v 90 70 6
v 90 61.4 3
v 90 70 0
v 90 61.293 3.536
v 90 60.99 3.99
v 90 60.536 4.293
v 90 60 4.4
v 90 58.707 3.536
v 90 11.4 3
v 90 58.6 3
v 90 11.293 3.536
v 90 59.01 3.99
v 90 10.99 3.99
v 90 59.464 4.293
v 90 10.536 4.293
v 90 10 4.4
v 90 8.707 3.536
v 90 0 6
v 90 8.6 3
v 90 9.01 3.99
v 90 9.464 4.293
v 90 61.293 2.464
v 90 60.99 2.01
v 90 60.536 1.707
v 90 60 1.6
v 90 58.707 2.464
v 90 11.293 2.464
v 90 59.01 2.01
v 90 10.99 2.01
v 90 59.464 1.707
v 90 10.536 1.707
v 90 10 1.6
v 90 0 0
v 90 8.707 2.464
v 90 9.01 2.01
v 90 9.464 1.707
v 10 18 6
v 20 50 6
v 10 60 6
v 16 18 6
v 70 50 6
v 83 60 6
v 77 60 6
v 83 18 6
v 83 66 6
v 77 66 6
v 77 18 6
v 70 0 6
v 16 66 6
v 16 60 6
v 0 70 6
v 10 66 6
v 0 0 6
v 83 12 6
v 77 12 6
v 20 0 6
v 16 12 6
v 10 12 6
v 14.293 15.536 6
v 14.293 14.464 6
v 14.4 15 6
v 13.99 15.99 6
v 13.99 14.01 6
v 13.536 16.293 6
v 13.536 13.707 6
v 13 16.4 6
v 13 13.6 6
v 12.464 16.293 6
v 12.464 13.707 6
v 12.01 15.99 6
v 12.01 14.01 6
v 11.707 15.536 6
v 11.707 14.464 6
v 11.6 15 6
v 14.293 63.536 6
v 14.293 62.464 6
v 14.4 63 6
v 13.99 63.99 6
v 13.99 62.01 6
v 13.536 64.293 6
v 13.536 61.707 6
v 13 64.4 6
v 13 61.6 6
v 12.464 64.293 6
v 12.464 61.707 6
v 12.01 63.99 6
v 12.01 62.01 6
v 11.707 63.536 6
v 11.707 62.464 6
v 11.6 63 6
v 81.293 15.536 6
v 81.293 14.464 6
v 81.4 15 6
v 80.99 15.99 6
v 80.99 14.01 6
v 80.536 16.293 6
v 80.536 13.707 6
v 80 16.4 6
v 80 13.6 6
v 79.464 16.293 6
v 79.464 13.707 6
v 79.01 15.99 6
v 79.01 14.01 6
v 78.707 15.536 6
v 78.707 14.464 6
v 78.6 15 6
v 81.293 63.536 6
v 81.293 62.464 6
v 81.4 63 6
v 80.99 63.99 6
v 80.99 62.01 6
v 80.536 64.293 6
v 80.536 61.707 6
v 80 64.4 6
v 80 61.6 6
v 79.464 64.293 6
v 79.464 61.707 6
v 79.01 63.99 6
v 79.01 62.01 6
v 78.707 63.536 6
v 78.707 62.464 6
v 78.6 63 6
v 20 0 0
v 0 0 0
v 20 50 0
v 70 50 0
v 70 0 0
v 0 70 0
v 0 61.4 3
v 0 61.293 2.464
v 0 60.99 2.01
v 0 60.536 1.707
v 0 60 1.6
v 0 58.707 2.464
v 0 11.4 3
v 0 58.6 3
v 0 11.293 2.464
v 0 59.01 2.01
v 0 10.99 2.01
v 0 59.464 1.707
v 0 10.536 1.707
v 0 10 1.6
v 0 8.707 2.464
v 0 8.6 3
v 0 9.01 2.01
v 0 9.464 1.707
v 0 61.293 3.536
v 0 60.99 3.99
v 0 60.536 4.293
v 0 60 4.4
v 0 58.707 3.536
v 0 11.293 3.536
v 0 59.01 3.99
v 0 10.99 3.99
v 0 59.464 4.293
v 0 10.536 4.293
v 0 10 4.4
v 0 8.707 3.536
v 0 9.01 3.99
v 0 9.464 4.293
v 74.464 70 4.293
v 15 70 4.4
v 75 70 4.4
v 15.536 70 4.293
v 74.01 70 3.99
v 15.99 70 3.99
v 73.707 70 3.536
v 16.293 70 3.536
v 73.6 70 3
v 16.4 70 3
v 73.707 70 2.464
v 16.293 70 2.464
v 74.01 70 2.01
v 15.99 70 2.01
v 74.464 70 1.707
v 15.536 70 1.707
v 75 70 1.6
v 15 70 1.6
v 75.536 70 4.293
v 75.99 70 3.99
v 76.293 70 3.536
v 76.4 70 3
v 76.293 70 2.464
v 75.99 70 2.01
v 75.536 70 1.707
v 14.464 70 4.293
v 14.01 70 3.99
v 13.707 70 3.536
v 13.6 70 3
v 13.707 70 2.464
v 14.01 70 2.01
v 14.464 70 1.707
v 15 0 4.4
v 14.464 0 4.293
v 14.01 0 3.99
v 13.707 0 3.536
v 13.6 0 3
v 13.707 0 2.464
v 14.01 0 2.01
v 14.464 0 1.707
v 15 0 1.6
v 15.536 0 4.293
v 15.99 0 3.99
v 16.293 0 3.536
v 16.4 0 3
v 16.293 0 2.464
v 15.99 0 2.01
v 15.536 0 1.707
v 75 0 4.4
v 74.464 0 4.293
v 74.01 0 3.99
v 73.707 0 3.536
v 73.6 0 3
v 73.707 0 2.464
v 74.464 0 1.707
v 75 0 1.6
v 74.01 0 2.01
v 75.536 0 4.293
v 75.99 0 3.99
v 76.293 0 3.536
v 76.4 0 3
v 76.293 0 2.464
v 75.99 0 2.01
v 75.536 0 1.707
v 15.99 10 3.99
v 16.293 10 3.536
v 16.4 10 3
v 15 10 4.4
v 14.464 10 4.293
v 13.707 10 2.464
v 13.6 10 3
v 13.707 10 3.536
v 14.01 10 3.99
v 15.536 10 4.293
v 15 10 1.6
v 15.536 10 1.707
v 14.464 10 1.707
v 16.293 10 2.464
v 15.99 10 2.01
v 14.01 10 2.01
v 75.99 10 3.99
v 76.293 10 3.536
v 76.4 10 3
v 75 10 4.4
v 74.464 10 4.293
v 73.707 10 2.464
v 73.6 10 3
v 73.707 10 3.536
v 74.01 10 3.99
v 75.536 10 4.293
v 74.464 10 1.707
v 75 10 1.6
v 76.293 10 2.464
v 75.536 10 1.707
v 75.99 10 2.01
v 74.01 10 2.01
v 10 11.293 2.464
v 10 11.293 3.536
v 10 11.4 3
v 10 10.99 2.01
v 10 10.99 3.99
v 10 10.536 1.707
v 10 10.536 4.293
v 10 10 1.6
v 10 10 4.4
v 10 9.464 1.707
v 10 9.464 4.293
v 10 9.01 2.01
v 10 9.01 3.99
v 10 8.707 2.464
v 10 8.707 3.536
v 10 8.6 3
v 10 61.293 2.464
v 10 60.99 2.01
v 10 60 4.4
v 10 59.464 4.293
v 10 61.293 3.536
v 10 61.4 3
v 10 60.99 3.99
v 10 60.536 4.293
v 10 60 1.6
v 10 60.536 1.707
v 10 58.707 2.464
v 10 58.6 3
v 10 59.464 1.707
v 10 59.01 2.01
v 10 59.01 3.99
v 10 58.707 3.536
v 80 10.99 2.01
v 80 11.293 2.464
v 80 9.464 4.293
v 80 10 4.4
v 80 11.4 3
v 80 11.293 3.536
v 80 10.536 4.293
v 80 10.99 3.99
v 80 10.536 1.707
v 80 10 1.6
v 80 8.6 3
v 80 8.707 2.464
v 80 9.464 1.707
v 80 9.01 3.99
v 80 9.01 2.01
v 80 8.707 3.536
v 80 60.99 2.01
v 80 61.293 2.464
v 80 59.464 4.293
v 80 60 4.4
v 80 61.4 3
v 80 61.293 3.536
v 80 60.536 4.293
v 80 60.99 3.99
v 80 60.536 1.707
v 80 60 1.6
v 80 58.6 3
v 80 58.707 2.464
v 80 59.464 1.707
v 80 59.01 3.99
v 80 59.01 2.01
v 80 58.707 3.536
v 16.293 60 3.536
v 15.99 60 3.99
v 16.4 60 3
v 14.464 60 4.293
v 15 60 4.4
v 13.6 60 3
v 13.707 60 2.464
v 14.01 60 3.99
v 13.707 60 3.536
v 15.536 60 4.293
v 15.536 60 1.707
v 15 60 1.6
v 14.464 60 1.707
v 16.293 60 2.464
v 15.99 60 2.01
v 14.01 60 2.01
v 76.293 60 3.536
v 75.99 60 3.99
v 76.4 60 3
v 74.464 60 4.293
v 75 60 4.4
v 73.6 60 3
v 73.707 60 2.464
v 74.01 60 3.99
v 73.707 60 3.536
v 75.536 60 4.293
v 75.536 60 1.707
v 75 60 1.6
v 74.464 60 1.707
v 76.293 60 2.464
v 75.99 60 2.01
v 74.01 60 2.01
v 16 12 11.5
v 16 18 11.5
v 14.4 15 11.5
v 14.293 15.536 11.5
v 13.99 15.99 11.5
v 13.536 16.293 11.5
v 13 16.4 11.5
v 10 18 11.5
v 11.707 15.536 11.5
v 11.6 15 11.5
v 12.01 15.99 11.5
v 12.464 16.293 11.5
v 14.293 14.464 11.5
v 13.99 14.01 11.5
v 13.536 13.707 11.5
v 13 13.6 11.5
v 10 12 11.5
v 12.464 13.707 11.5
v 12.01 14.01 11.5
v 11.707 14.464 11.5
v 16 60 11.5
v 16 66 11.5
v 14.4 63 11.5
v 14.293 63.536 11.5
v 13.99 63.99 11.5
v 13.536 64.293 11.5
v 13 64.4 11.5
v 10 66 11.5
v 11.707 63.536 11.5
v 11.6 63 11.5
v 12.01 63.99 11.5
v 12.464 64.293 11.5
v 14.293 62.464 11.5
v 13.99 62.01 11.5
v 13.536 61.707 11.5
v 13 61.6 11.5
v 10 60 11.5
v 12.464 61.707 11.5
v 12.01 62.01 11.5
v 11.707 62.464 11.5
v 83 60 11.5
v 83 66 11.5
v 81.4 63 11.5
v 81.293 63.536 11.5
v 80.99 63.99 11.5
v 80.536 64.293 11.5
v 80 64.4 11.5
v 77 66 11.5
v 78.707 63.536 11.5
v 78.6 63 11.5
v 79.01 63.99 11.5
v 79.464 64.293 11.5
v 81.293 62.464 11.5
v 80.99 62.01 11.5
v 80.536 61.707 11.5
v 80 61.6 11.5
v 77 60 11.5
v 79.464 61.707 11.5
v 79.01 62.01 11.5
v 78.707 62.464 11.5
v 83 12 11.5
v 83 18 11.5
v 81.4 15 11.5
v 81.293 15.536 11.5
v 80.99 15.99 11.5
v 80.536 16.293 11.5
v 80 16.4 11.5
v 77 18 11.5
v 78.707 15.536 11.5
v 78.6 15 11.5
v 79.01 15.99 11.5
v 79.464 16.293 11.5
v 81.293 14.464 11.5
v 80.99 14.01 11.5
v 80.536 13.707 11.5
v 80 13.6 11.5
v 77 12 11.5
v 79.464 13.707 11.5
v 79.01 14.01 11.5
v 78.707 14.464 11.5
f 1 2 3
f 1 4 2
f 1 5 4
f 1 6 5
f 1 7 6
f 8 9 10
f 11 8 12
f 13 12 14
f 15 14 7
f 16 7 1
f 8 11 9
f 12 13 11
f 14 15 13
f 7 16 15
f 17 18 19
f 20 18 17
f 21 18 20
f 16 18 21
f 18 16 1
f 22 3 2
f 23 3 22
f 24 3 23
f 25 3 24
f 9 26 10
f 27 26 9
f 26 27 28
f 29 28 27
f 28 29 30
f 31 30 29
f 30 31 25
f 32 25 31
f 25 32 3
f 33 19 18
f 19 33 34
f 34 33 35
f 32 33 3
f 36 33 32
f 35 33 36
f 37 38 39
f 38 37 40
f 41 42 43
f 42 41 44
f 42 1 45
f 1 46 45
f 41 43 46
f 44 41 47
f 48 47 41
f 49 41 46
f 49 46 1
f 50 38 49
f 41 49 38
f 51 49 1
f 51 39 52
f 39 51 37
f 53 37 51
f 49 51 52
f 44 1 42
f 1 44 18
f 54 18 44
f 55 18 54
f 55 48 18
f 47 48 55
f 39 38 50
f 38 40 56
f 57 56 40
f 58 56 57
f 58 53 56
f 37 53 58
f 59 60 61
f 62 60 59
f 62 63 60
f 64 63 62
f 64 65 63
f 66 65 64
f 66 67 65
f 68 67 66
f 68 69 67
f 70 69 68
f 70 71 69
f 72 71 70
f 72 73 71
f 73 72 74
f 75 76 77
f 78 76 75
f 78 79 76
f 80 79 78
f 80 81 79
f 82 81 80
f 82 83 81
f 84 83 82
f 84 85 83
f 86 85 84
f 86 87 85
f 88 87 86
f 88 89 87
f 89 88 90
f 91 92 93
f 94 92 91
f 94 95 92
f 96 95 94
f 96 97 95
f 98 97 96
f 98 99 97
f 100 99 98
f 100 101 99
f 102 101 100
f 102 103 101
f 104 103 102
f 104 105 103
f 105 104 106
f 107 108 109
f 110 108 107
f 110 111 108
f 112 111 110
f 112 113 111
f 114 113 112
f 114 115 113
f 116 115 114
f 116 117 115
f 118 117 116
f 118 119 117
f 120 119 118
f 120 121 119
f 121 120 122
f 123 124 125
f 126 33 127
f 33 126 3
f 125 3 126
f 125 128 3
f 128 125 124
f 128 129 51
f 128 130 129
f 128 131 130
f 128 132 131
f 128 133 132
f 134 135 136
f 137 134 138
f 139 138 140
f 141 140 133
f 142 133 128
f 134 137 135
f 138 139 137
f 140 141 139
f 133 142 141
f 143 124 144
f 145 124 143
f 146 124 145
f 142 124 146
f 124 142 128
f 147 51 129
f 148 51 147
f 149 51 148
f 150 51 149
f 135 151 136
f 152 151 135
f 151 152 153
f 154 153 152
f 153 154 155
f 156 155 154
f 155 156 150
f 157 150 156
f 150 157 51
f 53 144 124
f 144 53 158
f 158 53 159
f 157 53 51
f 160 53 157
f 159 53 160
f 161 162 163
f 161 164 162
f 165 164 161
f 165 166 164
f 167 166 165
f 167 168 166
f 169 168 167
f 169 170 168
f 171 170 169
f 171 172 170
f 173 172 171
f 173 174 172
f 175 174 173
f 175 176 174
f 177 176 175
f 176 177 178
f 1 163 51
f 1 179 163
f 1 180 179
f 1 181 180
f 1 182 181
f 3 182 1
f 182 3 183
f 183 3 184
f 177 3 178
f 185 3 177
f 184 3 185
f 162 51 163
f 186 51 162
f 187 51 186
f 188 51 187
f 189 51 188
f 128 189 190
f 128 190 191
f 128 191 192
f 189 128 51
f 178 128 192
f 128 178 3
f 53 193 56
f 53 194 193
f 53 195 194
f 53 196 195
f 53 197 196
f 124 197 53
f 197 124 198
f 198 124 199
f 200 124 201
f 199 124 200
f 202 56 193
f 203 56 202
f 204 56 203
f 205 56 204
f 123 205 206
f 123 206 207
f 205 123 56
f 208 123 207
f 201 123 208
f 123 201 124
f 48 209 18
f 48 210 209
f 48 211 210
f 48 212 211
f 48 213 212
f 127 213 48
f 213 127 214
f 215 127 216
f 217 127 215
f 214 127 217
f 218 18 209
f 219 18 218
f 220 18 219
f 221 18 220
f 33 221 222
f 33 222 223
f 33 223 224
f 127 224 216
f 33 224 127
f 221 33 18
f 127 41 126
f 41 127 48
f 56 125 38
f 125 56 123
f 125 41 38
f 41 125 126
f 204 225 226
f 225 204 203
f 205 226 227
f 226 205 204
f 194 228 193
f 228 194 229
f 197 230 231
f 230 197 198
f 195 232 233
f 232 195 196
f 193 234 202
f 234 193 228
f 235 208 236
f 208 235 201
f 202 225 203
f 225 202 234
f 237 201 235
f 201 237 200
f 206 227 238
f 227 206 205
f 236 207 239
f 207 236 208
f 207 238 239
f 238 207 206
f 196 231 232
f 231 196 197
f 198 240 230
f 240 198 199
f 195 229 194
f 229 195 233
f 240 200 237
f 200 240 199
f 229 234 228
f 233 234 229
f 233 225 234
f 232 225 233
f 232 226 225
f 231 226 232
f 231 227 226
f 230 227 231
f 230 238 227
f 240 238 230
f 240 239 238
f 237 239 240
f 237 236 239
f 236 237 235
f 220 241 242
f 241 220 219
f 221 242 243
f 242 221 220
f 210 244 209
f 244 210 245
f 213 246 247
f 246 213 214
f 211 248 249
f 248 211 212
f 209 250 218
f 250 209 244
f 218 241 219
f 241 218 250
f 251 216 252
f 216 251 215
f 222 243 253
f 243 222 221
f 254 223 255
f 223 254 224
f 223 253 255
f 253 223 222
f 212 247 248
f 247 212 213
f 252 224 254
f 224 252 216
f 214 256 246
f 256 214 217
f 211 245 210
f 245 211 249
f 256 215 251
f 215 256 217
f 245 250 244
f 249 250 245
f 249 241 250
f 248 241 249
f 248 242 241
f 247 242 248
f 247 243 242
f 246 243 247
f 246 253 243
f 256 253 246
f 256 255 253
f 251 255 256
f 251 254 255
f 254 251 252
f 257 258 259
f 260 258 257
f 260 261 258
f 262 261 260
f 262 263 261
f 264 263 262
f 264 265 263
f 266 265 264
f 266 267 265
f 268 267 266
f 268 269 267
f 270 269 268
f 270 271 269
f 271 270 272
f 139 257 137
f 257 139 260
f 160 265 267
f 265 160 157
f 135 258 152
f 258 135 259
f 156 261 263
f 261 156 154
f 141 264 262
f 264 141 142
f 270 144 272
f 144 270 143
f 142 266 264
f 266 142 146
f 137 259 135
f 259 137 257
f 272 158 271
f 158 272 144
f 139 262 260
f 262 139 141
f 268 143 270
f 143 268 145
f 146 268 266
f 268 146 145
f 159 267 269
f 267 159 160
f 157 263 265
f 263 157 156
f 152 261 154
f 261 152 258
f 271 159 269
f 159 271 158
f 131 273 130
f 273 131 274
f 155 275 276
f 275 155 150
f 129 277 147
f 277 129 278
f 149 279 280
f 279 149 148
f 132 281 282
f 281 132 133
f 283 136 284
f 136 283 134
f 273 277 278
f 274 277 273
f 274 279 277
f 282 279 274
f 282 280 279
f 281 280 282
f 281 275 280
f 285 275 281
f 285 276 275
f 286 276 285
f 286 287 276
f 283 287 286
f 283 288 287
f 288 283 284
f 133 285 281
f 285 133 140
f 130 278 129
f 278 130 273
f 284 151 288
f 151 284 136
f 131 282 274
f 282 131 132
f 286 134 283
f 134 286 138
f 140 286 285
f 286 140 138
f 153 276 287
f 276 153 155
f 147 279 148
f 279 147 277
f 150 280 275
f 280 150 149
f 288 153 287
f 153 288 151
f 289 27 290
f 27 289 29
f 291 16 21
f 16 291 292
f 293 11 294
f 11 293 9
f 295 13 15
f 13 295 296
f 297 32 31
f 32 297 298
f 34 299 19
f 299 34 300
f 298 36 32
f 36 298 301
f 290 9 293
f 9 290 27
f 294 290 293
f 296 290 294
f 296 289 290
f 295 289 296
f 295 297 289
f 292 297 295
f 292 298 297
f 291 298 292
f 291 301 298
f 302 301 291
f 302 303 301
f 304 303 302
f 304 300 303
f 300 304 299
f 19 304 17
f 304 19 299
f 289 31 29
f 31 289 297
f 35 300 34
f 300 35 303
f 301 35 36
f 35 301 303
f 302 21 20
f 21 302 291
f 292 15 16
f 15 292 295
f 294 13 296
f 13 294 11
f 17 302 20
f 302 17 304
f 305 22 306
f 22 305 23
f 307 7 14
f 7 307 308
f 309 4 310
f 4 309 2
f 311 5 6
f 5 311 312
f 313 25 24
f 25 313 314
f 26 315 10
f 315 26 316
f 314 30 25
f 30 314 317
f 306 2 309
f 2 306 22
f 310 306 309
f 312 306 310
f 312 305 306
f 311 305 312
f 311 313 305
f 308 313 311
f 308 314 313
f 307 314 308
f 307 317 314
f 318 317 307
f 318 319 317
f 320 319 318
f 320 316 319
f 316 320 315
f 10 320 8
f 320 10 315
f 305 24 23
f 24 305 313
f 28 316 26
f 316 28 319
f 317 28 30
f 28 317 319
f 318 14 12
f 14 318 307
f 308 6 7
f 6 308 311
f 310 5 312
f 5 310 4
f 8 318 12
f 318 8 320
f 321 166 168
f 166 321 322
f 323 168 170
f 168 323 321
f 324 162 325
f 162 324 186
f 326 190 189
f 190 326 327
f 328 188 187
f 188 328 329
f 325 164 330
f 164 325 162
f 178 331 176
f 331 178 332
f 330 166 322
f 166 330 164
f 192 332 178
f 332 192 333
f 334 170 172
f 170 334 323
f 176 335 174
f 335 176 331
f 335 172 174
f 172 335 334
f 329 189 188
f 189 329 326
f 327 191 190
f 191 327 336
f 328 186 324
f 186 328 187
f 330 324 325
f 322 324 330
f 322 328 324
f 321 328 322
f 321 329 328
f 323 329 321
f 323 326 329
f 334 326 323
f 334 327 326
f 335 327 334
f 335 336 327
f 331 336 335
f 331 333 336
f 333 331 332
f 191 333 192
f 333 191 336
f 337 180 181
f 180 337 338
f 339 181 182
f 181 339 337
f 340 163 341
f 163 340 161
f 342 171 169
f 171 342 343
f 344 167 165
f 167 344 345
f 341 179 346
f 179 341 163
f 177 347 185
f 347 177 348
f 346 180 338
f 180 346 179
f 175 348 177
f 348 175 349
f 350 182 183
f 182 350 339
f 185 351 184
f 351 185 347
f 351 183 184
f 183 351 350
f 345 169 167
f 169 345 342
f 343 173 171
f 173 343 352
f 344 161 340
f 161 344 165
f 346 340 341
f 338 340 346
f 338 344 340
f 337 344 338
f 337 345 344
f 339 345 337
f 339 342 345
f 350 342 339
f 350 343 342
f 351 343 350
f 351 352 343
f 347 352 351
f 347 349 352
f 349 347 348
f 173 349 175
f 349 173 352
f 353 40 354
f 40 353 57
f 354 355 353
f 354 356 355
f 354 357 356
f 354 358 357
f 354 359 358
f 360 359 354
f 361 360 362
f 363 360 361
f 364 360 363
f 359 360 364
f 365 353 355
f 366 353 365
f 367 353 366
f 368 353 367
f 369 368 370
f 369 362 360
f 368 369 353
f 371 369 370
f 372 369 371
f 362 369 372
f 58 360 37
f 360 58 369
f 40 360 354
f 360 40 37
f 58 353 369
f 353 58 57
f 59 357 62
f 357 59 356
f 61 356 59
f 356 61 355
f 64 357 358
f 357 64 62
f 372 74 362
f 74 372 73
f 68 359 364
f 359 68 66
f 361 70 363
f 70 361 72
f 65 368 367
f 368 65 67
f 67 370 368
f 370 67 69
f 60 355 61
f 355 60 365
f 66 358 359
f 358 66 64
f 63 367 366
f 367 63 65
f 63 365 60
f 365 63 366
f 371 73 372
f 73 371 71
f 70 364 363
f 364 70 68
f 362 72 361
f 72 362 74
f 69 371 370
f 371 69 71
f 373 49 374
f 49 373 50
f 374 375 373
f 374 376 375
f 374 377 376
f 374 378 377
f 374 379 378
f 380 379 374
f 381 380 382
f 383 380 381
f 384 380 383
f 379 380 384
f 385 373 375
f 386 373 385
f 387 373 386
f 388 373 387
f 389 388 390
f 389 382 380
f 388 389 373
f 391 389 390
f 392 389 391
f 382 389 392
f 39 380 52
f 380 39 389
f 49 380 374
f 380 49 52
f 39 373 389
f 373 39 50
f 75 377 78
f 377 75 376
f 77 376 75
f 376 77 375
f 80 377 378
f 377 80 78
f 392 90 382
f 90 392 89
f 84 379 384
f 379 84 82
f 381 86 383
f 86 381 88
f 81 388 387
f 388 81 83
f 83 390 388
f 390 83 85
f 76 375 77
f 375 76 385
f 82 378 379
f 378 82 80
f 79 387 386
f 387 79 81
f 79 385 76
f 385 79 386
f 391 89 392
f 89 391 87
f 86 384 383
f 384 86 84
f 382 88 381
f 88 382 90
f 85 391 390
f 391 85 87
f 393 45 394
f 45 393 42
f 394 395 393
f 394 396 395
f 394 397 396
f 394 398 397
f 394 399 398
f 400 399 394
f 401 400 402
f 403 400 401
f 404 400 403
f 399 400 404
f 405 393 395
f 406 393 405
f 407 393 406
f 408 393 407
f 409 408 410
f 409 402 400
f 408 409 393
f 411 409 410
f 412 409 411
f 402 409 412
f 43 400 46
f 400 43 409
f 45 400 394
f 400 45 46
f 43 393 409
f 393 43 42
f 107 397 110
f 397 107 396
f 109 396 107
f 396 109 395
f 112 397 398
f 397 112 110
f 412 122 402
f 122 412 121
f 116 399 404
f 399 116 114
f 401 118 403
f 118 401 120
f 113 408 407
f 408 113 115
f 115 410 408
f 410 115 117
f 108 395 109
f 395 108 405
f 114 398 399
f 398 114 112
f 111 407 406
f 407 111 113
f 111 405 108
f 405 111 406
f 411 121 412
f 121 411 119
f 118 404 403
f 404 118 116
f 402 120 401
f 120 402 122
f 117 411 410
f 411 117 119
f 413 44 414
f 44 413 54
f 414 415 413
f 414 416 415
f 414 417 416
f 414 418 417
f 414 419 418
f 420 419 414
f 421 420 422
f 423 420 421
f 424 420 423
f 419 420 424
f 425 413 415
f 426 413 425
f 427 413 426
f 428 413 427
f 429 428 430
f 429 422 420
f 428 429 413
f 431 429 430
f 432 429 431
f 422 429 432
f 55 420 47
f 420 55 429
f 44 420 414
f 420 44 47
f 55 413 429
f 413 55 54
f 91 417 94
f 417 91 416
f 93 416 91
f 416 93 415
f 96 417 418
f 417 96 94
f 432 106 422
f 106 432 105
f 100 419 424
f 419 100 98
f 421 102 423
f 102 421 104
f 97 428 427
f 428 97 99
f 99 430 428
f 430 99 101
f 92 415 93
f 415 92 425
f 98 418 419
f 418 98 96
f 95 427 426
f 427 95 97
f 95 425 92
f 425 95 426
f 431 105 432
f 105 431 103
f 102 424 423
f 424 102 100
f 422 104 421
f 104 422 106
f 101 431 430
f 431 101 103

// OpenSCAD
base_x_size = 90;
base_y_size = 70;
base_z_size = 6;

tap_hole_depth = 10;
tap_hole_r = 2.8/2; //M3.0 - 0.2

difference(){
	cube(size = [base_x_size, base_y_size, base_z_size], center = false);
	
	//切り欠き
	translate([20,0,0]) {
		cube(size = [50, 50, 8], center = false);
	}
	
	//backパネルねじ穴
	translate( [15 ,tap_hole_depth/2, base_z_size/2] ) rotate(a = [90, 0, 0] ){
		cylinder( h = tap_hole_depth, r = tap_hole_r, center = true , $fn=16 );
	}
	translate( [base_x_size - 15, tap_hole_depth/2, base_z_size/2] ) rotate(a = [90, 0, 0] ){
		cylinder( h = tap_hole_depth, r = tap_hole_r, center = true , $fn=16 );
	}

	//サイドパネルねじ穴
	translate( [tap_hole_depth/2, 10, base_z_size/2] ) rotate(a = [0, 90, 00] ){
		cylinder( h = tap_hole_depth, r = tap_hole_r, center = true , $fn=16 );
	}
	translate( [ tap_hole_depth/2, base_y_size - 10, base_z_size/2] ) rotate(a = [0, 90, 00] ){
		cylinder( h = tap_hole_depth, r = tap_hole_r, center = true , $fn=16 );
	}
	translate( [base_x_size - tap_hole_depth/2, 10, base_z_size/2] ) rotate(a = [0, 90, 00] ){
		cylinder( h = tap_hole_depth, r = tap_hole_r, center = true , $fn=16 );
	}
	translate( [base_x_size - tap_hole_depth/2, base_y_size - 10, base_z_size/2] ) rotate(a = [0, 90, 00] ){
		cylinder( h = tap_hole_depth, r = tap_hole_r, center = true , $fn=16 );
	}	

	//frontパネルねじ穴
	translate( [15 , base_y_size - tap_hole_depth/2, base_z_size/2] ) rotate(a = [90, 0, 0] ){
		cylinder( h = tap_hole_depth, r = tap_hole_r, center = true , $fn=16 );
	}
	translate( [base_x_size - 15, base_y_size - tap_hole_depth/2, base_z_size/2] ) rotate(a = [90, 0, 0] ){
		cylinder( h = tap_hole_depth, r = tap_hole_r, center = true , $fn=16 );
	}

}

pcb_mount_xy = 6;
pcb_mount_z = 5;
pcb_offset_x = 10;
pcb_offset_y = 15;
pcb_hole_x = 67;
pcb_hole_y = 48;

difference(){
	translate([pcb_offset_x + pcb_mount_xy/2 , pcb_offset_y, base_z_size+pcb_mount_z/2]) {
		cube(size = [pcb_mount_xy, pcb_mount_xy, base_z_size], center = true);
	}
	translate([pcb_offset_x + pcb_mount_xy/2 , pcb_offset_y, base_z_size+pcb_mount_z/2]) {
		cylinder( h = tap_hole_depth, r = tap_hole_r, center = true , $fn=16 );
	}
}

difference(){
	translate([pcb_offset_x + pcb_mount_xy/2 , pcb_offset_y + pcb_hole_y, base_z_size+pcb_mount_z/2]) {
		cube(size = [pcb_mount_xy, pcb_mount_xy, base_z_size], center = true);
	}
	translate([pcb_offset_x + pcb_mount_xy/2 , pcb_offset_y + pcb_hole_y, base_z_size+pcb_mount_z/2]) {
		cylinder( h = tap_hole_depth, r = tap_hole_r, center = true , $fn=16 );
	}
}

difference(){
	translate([pcb_offset_x + pcb_mount_xy/2 + pcb_hole_x , pcb_offset_y + pcb_hole_y, base_z_size+pcb_mount_z/2]) {
		cube(size = [pcb_mount_xy, pcb_mount_xy, base_z_size], center = true);
	}
	translate([pcb_offset_x + pcb_mount_xy/2 + pcb_hole_x , pcb_offset_y + pcb_hole_y, base_z_size+pcb_mount_z/2]) {
		cylinder( h = tap_hole_depth, r = tap_hole_r, center = true , $fn=16 );
	}
}

difference(){
	translate([pcb_offset_x + pcb_mount_xy/2 + pcb_hole_x , pcb_offset_y, base_z_size+pcb_mount_z/2]) {
		cube(size = [pcb_mount_xy, pcb_mount_xy, base_z_size], center = true);
	}
	translate([pcb_offset_x + pcb_mount_xy/2 + pcb_hole_x , pcb_offset_y, base_z_size+pcb_mount_z/2]) {
		cylinder( h = tap_hole_depth, r = tap_hole_r, center = true , $fn=16 );
	}
}
